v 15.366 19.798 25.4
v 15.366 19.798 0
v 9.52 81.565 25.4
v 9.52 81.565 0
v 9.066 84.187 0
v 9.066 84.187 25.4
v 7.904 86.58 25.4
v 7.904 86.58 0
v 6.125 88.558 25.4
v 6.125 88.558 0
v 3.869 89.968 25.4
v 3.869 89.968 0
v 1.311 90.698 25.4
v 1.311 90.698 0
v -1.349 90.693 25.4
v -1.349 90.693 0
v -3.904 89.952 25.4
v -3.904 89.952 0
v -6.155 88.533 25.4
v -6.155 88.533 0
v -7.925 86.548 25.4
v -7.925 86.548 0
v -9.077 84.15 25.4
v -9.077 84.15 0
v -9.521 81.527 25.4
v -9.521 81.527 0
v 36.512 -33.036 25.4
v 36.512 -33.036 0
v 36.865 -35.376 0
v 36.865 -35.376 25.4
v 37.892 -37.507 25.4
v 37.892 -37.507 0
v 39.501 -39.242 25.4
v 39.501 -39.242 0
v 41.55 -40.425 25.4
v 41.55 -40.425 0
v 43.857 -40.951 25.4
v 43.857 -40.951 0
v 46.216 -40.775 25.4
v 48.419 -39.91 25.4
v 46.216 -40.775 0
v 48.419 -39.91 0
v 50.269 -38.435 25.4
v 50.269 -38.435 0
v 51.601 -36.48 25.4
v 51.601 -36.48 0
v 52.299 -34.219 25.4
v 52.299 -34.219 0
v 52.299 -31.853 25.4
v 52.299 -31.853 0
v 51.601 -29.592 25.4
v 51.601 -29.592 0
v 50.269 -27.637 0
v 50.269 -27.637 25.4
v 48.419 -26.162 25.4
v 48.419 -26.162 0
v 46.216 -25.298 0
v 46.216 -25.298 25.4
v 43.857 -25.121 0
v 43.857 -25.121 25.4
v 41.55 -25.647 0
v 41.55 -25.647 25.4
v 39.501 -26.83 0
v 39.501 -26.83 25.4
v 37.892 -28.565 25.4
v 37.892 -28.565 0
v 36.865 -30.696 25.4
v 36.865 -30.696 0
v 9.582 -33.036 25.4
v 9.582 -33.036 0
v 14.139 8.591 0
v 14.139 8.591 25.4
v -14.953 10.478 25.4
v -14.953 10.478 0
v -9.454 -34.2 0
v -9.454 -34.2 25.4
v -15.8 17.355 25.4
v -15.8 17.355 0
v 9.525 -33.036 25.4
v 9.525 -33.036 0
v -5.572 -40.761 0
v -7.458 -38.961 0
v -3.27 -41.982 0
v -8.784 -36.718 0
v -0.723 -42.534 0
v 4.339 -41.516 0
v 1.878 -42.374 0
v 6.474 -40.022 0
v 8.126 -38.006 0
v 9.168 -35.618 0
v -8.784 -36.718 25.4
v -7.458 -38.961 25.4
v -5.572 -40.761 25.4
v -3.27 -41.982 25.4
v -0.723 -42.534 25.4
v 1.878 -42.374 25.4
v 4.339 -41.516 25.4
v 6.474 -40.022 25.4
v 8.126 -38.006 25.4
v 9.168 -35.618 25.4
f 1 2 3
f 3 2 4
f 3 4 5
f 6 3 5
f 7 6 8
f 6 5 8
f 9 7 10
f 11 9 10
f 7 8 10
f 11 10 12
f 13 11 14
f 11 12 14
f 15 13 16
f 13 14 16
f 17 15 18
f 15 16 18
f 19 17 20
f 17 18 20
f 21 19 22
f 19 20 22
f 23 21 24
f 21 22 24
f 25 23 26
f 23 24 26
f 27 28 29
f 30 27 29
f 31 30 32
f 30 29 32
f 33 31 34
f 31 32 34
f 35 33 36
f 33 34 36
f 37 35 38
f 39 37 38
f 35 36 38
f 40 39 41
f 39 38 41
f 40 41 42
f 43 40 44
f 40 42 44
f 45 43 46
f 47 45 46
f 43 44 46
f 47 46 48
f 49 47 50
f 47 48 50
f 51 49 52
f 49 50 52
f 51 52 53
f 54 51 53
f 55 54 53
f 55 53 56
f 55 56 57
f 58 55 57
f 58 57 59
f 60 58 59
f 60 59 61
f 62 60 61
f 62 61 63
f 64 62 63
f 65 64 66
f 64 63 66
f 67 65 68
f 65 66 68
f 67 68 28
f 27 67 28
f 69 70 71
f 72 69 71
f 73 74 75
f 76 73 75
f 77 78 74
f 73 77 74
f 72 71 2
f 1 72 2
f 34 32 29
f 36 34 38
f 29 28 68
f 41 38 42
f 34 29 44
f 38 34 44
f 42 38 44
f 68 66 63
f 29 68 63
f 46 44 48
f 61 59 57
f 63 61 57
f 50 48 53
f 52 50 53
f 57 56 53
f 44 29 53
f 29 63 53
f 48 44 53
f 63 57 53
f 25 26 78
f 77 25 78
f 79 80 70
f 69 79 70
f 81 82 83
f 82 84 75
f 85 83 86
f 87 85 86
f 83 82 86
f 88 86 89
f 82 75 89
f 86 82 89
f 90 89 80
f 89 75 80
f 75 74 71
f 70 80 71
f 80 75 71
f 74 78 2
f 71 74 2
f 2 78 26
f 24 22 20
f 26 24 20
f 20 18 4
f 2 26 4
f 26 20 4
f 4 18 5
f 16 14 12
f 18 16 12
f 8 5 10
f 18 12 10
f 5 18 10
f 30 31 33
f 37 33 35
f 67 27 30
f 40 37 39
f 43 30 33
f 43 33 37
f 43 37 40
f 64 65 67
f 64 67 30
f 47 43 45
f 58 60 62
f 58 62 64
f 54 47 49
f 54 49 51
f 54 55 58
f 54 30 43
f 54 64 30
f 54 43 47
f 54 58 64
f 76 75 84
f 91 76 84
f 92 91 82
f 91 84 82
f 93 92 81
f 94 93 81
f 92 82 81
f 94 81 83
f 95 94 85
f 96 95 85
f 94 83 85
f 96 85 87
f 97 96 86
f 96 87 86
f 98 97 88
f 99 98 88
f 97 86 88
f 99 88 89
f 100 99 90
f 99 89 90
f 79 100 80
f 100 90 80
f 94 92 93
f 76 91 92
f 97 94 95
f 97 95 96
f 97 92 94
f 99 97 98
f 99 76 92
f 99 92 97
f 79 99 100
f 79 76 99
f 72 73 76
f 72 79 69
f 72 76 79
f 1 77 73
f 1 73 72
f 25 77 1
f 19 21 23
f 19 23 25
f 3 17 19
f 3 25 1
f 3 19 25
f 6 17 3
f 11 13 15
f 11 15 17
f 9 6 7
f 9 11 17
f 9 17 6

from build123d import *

# Parameters (mm, degrees)
F1_DEPTH = 25.4


with BuildPart() as f1:
    # F0 (on Top) → F1 (new body)
    with BuildSketch(Plane.XY):
        with BuildLine():
            ThreePointArc((9.525, 81.2639421549), (6.7351920908, 74.5287500641), (0, 71.7389421549))
            Line((0, 71.7389421549), (0, 31.6843353925))
            ThreePointArc((0, 31.6843353925), (9.7131531423, 28.3660181166), (15.3656670562, 19.7983078062))
            Line((15.3656670562, 19.7983078062), (9.5202281659, 81.565406365))
            ThreePointArc((9.5202281659, 81.565406365), (9.5238069667, 81.4146931419), (9.525, 81.2639421549))
        make_face()
        with BuildLine():
            Line((0, 31.6843353925), (0, 71.7389421549))
            ThreePointArc((0, 71.7389421549), (-6.8274747454, 74.6223148241), (-9.5213738308, 81.5267450733))
            Line((-9.5213738308, 81.5267450733), (-15.7995668357, 17.3550756048))
            ThreePointArc((-15.7995668357, 17.3550756048), (-10.6648253415, 27.568464843), (0, 31.6843353925))
        make_face()
        with BuildLine():
            Line((0, -23.5110578451), (0, -0.0656646075))
            ThreePointArc((0, -0.0656646075), (-9.1483416691, 2.8353818814), (-14.9530909628, 10.4782289728))
            Line((-14.9530909628, 10.4782289728), (-9.4536515863, -34.1997144463))
            ThreePointArc((-9.4536515863, -34.1997144463), (-7.1347548706, -26.7256776714), (0, -23.5110578451))
        make_face()
        with BuildLine():
            ThreePointArc((14.1387534307, 8.590521333), (8.2890576004, 2.2702383363), (0, -0.0656646075))
            Line((0, -0.0656646075), (0, -23.5110578451))
            ThreePointArc((0, -23.5110578451), (6.7351920908, -26.3008657543), (9.525, -33.0360578451))
            Line((9.525, -33.0360578451), (9.581902058, -33.0360578451))
            Line((9.581902058, -33.0360578451), (14.1387534307, 8.590521333))
        make_face()
        with BuildLine():
            Line((0, -33.0360578451), (0, -23.5110578451))
            ThreePointArc((0, -23.5110578451), (-7.1347548706, -26.7256776714), (-9.4536515863, -34.1997144463))
            ThreePointArc((-9.4536515863, -34.1997144463), (0.5829209384, -42.5432040089), (9.525, -33.0360578451))
            Line((9.525, -33.0360578451), (0, -33.0360578451))
        make_face()
        with BuildLine():
            ThreePointArc((9.525, -33.0360578451), (6.7351920908, -26.3008657543), (0, -23.5110578451))
            Line((0, -23.5110578451), (0, -33.0360578451))
            Line((0, -33.0360578451), (9.525, -33.0360578451))
        make_face()
        with BuildLine():
            ThreePointArc((-9.5213738308, 81.5267450733), (-6.8274747454, 74.6223148241), (0, 71.7389421549))
            ThreePointArc((0, 71.7389421549), (6.7351920908, 74.5287500641), (9.525, 81.2639421549))
            ThreePointArc((9.525, 81.2639421549), (9.5238069667, 81.4146931419), (9.5202281659, 81.565406365))
            ThreePointArc((9.5202281659, 81.565406365), (-0.0193391315, 90.7889225222), (-9.5213738308, 81.5267450733))
        make_face()
        with BuildLine():
            ThreePointArc((15.3656670562, 19.7983078062), (9.7131531423, 28.3660181166), (0, 31.6843353925))
            Line((0, 31.6843353925), (0, -0.0656646075))
            ThreePointArc((0, -0.0656646075), (8.2890576004, 2.2702383363), (14.1387534307, 8.590521333))
            Line((14.1387534307, 8.590521333), (15.3656670562, 19.7983078062))
        make_face()
        with BuildLine():
            Line((0, -0.0656646075), (0, 31.6843353925))
            ThreePointArc((0, 31.6843353925), (-10.6648253415, 27.568464843), (-15.7995668357, 17.3550756048))
            Line((-15.7995668357, 17.3550756048), (-14.9530909628, 10.4782289728))
            ThreePointArc((-14.9530909628, 10.4782289728), (-9.1483416691, 2.8353818814), (0, -0.0656646075))
        make_face()
    extrude(amount=F1_DEPTH)


with BuildPart() as f1b:
    # F0 (on Top) → F1, piece 2 (new body)
    with BuildSketch(Plane.XY):
        with BuildLine():
            ThreePointArc((52.3875, -33.0360578451), (44.45, -25.0985578451), (36.5125, -33.0360578451))
            ThreePointArc((36.5125, -33.0360578451), (44.45, -40.9735578451), (52.3875, -33.0360578451))
        make_face()
    extrude(amount=F1_DEPTH)


solid = Compound([f1.part, f1b.part])
